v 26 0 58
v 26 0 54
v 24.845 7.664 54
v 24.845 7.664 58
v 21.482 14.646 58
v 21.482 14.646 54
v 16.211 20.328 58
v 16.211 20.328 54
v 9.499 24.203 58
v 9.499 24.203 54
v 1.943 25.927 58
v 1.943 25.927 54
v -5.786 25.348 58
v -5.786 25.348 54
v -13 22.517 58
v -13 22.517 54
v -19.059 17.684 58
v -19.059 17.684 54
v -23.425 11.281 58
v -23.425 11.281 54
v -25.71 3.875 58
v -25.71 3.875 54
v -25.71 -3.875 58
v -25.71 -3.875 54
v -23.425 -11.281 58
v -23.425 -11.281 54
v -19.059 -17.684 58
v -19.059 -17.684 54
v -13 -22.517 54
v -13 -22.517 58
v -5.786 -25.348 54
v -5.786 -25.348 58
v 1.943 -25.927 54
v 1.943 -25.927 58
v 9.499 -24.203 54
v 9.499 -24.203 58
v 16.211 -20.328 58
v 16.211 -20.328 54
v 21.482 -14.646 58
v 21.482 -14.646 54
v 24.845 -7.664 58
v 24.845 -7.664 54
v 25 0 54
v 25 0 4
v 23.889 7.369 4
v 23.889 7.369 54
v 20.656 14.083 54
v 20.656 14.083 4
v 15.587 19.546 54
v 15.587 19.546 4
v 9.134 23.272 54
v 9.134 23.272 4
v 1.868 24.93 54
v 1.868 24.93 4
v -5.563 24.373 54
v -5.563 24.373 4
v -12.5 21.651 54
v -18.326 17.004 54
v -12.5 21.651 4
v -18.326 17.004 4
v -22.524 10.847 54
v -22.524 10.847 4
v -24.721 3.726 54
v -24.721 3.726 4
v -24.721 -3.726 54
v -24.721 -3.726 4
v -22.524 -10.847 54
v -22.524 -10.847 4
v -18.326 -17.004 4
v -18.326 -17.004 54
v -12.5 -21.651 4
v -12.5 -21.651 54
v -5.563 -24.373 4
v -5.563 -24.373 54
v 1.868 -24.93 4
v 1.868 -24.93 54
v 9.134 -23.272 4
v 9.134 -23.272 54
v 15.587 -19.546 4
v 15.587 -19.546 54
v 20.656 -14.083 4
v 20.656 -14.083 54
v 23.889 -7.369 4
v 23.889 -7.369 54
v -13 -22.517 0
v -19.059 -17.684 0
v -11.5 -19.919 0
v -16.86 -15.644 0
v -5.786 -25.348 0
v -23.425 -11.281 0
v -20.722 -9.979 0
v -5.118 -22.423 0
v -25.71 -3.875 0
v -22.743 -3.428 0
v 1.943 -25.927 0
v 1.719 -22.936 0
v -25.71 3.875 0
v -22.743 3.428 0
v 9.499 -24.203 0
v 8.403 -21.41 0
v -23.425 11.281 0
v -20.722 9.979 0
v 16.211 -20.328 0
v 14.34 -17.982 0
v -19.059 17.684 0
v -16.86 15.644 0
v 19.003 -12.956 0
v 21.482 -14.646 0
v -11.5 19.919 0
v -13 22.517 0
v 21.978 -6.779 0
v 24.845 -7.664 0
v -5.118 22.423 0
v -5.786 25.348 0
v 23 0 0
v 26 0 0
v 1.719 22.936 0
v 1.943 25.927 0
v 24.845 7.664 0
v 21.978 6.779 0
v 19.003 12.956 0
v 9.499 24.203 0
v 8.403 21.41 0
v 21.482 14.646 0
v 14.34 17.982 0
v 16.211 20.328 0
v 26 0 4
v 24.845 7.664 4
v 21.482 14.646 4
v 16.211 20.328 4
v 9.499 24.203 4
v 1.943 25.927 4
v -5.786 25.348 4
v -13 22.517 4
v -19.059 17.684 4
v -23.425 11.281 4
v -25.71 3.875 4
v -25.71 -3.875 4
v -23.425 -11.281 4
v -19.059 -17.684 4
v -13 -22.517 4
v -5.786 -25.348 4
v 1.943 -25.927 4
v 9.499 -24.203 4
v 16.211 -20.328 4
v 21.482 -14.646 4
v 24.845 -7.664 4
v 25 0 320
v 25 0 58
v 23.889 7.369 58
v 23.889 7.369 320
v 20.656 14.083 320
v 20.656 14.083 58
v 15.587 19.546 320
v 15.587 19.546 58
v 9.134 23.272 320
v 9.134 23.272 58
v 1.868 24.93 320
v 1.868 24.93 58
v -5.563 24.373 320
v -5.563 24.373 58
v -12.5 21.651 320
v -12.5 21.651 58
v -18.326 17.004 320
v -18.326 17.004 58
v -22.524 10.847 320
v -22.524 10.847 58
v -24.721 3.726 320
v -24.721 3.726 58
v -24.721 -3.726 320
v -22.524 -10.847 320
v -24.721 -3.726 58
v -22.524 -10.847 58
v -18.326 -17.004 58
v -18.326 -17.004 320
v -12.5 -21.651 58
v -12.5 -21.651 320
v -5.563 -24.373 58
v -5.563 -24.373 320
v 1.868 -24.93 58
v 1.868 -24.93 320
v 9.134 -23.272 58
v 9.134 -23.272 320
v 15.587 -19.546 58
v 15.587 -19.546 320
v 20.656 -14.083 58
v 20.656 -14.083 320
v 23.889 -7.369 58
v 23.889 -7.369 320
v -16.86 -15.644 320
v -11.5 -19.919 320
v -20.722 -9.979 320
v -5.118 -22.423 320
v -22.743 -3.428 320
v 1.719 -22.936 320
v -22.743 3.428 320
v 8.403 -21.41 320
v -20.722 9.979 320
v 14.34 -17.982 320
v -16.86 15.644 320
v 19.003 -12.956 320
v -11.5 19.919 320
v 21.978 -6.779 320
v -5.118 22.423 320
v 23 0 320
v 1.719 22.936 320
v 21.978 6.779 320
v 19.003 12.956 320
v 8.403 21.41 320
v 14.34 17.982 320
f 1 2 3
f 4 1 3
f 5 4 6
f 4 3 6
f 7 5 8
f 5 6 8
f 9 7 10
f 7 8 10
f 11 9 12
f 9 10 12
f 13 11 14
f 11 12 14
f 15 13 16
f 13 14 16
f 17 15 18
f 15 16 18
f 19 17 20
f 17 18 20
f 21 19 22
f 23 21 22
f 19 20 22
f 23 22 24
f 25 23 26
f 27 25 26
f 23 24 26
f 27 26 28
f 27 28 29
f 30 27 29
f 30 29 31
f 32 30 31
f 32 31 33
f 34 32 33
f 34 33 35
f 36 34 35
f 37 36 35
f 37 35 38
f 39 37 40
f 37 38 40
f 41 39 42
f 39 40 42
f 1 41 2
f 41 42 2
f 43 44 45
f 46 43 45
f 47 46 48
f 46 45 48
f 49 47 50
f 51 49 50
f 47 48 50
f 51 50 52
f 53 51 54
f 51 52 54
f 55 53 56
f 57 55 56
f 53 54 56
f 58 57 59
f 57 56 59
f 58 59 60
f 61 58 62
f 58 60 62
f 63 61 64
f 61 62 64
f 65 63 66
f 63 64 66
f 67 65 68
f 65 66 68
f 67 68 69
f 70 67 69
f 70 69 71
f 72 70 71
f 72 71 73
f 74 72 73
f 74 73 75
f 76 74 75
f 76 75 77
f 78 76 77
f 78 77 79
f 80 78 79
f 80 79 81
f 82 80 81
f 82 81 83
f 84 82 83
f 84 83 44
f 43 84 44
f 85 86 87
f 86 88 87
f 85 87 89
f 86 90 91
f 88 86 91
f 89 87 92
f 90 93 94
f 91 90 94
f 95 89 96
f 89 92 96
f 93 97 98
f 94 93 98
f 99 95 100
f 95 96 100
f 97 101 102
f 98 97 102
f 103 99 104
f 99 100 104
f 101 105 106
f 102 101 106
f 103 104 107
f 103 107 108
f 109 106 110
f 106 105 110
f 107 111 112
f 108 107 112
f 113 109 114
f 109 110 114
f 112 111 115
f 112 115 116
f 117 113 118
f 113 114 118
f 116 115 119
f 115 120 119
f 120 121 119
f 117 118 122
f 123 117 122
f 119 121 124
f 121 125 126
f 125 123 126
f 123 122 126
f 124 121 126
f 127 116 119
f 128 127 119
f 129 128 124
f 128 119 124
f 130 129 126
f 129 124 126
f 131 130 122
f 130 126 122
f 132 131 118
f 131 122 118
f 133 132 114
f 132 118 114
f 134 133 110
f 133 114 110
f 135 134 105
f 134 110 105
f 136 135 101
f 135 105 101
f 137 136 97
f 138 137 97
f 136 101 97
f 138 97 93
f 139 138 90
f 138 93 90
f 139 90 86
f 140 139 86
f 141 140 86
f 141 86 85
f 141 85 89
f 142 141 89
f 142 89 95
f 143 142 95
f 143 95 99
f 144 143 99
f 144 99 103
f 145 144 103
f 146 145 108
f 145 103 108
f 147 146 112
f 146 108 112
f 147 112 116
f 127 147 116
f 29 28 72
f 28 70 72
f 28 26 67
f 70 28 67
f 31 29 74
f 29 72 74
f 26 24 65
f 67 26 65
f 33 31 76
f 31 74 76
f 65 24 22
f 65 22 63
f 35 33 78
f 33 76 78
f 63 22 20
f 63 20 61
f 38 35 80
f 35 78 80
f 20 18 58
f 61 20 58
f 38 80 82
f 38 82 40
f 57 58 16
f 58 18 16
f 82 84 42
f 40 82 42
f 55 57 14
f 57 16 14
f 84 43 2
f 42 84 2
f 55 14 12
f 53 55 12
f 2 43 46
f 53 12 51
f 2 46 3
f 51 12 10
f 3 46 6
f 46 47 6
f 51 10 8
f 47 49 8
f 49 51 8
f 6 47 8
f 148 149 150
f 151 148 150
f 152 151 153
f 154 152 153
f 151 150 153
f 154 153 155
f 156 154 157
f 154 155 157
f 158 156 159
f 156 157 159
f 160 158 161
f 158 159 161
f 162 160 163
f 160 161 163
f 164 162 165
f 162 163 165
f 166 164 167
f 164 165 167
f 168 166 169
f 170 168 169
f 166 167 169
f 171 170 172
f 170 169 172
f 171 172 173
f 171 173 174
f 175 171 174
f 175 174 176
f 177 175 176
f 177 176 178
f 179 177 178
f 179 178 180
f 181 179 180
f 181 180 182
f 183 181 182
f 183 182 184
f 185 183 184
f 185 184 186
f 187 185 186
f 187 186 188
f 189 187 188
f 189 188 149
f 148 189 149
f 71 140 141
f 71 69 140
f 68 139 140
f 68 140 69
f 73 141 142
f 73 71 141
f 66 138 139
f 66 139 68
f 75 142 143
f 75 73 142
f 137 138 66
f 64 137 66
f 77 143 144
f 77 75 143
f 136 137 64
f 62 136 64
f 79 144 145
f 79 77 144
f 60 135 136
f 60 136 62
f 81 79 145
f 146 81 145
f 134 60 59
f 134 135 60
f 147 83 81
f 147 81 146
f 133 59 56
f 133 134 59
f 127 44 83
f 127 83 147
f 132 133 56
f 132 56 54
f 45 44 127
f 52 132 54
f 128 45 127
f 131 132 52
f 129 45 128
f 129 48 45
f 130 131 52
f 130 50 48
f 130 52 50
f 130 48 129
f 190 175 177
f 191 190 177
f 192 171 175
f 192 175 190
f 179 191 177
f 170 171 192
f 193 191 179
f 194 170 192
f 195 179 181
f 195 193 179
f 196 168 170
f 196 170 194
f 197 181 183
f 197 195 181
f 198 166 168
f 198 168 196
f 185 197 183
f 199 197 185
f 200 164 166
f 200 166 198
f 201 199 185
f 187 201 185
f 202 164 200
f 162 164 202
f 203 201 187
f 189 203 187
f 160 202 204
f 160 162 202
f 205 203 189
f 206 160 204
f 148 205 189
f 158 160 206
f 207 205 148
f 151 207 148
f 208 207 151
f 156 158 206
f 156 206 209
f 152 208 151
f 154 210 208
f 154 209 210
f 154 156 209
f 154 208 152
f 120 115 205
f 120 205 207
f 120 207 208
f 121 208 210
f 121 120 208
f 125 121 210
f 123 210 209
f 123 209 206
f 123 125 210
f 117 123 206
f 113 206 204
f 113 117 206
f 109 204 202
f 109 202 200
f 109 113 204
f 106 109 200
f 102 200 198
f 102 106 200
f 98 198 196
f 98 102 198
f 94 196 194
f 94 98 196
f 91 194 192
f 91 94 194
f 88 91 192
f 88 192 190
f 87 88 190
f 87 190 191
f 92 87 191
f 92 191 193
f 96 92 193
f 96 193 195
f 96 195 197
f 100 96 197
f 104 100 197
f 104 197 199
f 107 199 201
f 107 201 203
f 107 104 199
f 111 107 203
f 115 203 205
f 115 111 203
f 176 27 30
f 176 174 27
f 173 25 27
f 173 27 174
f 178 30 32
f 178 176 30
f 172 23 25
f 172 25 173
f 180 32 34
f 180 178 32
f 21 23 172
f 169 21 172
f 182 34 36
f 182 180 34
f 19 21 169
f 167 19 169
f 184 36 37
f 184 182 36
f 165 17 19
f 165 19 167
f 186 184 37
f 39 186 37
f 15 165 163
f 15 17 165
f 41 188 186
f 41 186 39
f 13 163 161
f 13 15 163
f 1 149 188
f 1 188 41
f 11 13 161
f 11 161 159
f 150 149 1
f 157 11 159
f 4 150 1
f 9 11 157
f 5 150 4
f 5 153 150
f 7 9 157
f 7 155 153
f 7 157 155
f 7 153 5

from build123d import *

# Parameters (mm, degrees)
SKETCH2_R           = 25
SKETCH2_R_2         = 23
BOSS_EXTRUDE1_DEPTH = 320
BOSS_EXTRUDE2_START = 54
SKETCH2_3_R         = 26
SKETCH2_3_R_2       = 25
BOSS_EXTRUDE2_DEPTH = 4
SKETCH2_4_R         = 26
SKETCH2_4_R_2       = 25
BOSS_EXTRUDE3_DEPTH = 4


with BuildPart() as part:
    # Sketch2 → Boss-Extrude1 (new body)
    with BuildSketch(Plane.XY):
        Circle(SKETCH2_R)
        Circle(SKETCH2_R_2, mode=Mode.SUBTRACT)
    extrude(amount=BOSS_EXTRUDE1_DEPTH)

    # Sketch2<3> → Boss-Extrude2 (add)
    with BuildSketch(Plane.XY.offset(BOSS_EXTRUDE2_START)):
        Circle(SKETCH2_3_R)
        Circle(SKETCH2_3_R_2, mode=Mode.SUBTRACT)
    extrude(amount=BOSS_EXTRUDE2_DEPTH)

    # Sketch2<4> → Boss-Extrude3 (add)
    with BuildSketch(Plane.XY):
        Circle(SKETCH2_4_R)
        Circle(SKETCH2_4_R_2, mode=Mode.SUBTRACT)
    extrude(amount=BOSS_EXTRUDE3_DEPTH)


solid = part.part
